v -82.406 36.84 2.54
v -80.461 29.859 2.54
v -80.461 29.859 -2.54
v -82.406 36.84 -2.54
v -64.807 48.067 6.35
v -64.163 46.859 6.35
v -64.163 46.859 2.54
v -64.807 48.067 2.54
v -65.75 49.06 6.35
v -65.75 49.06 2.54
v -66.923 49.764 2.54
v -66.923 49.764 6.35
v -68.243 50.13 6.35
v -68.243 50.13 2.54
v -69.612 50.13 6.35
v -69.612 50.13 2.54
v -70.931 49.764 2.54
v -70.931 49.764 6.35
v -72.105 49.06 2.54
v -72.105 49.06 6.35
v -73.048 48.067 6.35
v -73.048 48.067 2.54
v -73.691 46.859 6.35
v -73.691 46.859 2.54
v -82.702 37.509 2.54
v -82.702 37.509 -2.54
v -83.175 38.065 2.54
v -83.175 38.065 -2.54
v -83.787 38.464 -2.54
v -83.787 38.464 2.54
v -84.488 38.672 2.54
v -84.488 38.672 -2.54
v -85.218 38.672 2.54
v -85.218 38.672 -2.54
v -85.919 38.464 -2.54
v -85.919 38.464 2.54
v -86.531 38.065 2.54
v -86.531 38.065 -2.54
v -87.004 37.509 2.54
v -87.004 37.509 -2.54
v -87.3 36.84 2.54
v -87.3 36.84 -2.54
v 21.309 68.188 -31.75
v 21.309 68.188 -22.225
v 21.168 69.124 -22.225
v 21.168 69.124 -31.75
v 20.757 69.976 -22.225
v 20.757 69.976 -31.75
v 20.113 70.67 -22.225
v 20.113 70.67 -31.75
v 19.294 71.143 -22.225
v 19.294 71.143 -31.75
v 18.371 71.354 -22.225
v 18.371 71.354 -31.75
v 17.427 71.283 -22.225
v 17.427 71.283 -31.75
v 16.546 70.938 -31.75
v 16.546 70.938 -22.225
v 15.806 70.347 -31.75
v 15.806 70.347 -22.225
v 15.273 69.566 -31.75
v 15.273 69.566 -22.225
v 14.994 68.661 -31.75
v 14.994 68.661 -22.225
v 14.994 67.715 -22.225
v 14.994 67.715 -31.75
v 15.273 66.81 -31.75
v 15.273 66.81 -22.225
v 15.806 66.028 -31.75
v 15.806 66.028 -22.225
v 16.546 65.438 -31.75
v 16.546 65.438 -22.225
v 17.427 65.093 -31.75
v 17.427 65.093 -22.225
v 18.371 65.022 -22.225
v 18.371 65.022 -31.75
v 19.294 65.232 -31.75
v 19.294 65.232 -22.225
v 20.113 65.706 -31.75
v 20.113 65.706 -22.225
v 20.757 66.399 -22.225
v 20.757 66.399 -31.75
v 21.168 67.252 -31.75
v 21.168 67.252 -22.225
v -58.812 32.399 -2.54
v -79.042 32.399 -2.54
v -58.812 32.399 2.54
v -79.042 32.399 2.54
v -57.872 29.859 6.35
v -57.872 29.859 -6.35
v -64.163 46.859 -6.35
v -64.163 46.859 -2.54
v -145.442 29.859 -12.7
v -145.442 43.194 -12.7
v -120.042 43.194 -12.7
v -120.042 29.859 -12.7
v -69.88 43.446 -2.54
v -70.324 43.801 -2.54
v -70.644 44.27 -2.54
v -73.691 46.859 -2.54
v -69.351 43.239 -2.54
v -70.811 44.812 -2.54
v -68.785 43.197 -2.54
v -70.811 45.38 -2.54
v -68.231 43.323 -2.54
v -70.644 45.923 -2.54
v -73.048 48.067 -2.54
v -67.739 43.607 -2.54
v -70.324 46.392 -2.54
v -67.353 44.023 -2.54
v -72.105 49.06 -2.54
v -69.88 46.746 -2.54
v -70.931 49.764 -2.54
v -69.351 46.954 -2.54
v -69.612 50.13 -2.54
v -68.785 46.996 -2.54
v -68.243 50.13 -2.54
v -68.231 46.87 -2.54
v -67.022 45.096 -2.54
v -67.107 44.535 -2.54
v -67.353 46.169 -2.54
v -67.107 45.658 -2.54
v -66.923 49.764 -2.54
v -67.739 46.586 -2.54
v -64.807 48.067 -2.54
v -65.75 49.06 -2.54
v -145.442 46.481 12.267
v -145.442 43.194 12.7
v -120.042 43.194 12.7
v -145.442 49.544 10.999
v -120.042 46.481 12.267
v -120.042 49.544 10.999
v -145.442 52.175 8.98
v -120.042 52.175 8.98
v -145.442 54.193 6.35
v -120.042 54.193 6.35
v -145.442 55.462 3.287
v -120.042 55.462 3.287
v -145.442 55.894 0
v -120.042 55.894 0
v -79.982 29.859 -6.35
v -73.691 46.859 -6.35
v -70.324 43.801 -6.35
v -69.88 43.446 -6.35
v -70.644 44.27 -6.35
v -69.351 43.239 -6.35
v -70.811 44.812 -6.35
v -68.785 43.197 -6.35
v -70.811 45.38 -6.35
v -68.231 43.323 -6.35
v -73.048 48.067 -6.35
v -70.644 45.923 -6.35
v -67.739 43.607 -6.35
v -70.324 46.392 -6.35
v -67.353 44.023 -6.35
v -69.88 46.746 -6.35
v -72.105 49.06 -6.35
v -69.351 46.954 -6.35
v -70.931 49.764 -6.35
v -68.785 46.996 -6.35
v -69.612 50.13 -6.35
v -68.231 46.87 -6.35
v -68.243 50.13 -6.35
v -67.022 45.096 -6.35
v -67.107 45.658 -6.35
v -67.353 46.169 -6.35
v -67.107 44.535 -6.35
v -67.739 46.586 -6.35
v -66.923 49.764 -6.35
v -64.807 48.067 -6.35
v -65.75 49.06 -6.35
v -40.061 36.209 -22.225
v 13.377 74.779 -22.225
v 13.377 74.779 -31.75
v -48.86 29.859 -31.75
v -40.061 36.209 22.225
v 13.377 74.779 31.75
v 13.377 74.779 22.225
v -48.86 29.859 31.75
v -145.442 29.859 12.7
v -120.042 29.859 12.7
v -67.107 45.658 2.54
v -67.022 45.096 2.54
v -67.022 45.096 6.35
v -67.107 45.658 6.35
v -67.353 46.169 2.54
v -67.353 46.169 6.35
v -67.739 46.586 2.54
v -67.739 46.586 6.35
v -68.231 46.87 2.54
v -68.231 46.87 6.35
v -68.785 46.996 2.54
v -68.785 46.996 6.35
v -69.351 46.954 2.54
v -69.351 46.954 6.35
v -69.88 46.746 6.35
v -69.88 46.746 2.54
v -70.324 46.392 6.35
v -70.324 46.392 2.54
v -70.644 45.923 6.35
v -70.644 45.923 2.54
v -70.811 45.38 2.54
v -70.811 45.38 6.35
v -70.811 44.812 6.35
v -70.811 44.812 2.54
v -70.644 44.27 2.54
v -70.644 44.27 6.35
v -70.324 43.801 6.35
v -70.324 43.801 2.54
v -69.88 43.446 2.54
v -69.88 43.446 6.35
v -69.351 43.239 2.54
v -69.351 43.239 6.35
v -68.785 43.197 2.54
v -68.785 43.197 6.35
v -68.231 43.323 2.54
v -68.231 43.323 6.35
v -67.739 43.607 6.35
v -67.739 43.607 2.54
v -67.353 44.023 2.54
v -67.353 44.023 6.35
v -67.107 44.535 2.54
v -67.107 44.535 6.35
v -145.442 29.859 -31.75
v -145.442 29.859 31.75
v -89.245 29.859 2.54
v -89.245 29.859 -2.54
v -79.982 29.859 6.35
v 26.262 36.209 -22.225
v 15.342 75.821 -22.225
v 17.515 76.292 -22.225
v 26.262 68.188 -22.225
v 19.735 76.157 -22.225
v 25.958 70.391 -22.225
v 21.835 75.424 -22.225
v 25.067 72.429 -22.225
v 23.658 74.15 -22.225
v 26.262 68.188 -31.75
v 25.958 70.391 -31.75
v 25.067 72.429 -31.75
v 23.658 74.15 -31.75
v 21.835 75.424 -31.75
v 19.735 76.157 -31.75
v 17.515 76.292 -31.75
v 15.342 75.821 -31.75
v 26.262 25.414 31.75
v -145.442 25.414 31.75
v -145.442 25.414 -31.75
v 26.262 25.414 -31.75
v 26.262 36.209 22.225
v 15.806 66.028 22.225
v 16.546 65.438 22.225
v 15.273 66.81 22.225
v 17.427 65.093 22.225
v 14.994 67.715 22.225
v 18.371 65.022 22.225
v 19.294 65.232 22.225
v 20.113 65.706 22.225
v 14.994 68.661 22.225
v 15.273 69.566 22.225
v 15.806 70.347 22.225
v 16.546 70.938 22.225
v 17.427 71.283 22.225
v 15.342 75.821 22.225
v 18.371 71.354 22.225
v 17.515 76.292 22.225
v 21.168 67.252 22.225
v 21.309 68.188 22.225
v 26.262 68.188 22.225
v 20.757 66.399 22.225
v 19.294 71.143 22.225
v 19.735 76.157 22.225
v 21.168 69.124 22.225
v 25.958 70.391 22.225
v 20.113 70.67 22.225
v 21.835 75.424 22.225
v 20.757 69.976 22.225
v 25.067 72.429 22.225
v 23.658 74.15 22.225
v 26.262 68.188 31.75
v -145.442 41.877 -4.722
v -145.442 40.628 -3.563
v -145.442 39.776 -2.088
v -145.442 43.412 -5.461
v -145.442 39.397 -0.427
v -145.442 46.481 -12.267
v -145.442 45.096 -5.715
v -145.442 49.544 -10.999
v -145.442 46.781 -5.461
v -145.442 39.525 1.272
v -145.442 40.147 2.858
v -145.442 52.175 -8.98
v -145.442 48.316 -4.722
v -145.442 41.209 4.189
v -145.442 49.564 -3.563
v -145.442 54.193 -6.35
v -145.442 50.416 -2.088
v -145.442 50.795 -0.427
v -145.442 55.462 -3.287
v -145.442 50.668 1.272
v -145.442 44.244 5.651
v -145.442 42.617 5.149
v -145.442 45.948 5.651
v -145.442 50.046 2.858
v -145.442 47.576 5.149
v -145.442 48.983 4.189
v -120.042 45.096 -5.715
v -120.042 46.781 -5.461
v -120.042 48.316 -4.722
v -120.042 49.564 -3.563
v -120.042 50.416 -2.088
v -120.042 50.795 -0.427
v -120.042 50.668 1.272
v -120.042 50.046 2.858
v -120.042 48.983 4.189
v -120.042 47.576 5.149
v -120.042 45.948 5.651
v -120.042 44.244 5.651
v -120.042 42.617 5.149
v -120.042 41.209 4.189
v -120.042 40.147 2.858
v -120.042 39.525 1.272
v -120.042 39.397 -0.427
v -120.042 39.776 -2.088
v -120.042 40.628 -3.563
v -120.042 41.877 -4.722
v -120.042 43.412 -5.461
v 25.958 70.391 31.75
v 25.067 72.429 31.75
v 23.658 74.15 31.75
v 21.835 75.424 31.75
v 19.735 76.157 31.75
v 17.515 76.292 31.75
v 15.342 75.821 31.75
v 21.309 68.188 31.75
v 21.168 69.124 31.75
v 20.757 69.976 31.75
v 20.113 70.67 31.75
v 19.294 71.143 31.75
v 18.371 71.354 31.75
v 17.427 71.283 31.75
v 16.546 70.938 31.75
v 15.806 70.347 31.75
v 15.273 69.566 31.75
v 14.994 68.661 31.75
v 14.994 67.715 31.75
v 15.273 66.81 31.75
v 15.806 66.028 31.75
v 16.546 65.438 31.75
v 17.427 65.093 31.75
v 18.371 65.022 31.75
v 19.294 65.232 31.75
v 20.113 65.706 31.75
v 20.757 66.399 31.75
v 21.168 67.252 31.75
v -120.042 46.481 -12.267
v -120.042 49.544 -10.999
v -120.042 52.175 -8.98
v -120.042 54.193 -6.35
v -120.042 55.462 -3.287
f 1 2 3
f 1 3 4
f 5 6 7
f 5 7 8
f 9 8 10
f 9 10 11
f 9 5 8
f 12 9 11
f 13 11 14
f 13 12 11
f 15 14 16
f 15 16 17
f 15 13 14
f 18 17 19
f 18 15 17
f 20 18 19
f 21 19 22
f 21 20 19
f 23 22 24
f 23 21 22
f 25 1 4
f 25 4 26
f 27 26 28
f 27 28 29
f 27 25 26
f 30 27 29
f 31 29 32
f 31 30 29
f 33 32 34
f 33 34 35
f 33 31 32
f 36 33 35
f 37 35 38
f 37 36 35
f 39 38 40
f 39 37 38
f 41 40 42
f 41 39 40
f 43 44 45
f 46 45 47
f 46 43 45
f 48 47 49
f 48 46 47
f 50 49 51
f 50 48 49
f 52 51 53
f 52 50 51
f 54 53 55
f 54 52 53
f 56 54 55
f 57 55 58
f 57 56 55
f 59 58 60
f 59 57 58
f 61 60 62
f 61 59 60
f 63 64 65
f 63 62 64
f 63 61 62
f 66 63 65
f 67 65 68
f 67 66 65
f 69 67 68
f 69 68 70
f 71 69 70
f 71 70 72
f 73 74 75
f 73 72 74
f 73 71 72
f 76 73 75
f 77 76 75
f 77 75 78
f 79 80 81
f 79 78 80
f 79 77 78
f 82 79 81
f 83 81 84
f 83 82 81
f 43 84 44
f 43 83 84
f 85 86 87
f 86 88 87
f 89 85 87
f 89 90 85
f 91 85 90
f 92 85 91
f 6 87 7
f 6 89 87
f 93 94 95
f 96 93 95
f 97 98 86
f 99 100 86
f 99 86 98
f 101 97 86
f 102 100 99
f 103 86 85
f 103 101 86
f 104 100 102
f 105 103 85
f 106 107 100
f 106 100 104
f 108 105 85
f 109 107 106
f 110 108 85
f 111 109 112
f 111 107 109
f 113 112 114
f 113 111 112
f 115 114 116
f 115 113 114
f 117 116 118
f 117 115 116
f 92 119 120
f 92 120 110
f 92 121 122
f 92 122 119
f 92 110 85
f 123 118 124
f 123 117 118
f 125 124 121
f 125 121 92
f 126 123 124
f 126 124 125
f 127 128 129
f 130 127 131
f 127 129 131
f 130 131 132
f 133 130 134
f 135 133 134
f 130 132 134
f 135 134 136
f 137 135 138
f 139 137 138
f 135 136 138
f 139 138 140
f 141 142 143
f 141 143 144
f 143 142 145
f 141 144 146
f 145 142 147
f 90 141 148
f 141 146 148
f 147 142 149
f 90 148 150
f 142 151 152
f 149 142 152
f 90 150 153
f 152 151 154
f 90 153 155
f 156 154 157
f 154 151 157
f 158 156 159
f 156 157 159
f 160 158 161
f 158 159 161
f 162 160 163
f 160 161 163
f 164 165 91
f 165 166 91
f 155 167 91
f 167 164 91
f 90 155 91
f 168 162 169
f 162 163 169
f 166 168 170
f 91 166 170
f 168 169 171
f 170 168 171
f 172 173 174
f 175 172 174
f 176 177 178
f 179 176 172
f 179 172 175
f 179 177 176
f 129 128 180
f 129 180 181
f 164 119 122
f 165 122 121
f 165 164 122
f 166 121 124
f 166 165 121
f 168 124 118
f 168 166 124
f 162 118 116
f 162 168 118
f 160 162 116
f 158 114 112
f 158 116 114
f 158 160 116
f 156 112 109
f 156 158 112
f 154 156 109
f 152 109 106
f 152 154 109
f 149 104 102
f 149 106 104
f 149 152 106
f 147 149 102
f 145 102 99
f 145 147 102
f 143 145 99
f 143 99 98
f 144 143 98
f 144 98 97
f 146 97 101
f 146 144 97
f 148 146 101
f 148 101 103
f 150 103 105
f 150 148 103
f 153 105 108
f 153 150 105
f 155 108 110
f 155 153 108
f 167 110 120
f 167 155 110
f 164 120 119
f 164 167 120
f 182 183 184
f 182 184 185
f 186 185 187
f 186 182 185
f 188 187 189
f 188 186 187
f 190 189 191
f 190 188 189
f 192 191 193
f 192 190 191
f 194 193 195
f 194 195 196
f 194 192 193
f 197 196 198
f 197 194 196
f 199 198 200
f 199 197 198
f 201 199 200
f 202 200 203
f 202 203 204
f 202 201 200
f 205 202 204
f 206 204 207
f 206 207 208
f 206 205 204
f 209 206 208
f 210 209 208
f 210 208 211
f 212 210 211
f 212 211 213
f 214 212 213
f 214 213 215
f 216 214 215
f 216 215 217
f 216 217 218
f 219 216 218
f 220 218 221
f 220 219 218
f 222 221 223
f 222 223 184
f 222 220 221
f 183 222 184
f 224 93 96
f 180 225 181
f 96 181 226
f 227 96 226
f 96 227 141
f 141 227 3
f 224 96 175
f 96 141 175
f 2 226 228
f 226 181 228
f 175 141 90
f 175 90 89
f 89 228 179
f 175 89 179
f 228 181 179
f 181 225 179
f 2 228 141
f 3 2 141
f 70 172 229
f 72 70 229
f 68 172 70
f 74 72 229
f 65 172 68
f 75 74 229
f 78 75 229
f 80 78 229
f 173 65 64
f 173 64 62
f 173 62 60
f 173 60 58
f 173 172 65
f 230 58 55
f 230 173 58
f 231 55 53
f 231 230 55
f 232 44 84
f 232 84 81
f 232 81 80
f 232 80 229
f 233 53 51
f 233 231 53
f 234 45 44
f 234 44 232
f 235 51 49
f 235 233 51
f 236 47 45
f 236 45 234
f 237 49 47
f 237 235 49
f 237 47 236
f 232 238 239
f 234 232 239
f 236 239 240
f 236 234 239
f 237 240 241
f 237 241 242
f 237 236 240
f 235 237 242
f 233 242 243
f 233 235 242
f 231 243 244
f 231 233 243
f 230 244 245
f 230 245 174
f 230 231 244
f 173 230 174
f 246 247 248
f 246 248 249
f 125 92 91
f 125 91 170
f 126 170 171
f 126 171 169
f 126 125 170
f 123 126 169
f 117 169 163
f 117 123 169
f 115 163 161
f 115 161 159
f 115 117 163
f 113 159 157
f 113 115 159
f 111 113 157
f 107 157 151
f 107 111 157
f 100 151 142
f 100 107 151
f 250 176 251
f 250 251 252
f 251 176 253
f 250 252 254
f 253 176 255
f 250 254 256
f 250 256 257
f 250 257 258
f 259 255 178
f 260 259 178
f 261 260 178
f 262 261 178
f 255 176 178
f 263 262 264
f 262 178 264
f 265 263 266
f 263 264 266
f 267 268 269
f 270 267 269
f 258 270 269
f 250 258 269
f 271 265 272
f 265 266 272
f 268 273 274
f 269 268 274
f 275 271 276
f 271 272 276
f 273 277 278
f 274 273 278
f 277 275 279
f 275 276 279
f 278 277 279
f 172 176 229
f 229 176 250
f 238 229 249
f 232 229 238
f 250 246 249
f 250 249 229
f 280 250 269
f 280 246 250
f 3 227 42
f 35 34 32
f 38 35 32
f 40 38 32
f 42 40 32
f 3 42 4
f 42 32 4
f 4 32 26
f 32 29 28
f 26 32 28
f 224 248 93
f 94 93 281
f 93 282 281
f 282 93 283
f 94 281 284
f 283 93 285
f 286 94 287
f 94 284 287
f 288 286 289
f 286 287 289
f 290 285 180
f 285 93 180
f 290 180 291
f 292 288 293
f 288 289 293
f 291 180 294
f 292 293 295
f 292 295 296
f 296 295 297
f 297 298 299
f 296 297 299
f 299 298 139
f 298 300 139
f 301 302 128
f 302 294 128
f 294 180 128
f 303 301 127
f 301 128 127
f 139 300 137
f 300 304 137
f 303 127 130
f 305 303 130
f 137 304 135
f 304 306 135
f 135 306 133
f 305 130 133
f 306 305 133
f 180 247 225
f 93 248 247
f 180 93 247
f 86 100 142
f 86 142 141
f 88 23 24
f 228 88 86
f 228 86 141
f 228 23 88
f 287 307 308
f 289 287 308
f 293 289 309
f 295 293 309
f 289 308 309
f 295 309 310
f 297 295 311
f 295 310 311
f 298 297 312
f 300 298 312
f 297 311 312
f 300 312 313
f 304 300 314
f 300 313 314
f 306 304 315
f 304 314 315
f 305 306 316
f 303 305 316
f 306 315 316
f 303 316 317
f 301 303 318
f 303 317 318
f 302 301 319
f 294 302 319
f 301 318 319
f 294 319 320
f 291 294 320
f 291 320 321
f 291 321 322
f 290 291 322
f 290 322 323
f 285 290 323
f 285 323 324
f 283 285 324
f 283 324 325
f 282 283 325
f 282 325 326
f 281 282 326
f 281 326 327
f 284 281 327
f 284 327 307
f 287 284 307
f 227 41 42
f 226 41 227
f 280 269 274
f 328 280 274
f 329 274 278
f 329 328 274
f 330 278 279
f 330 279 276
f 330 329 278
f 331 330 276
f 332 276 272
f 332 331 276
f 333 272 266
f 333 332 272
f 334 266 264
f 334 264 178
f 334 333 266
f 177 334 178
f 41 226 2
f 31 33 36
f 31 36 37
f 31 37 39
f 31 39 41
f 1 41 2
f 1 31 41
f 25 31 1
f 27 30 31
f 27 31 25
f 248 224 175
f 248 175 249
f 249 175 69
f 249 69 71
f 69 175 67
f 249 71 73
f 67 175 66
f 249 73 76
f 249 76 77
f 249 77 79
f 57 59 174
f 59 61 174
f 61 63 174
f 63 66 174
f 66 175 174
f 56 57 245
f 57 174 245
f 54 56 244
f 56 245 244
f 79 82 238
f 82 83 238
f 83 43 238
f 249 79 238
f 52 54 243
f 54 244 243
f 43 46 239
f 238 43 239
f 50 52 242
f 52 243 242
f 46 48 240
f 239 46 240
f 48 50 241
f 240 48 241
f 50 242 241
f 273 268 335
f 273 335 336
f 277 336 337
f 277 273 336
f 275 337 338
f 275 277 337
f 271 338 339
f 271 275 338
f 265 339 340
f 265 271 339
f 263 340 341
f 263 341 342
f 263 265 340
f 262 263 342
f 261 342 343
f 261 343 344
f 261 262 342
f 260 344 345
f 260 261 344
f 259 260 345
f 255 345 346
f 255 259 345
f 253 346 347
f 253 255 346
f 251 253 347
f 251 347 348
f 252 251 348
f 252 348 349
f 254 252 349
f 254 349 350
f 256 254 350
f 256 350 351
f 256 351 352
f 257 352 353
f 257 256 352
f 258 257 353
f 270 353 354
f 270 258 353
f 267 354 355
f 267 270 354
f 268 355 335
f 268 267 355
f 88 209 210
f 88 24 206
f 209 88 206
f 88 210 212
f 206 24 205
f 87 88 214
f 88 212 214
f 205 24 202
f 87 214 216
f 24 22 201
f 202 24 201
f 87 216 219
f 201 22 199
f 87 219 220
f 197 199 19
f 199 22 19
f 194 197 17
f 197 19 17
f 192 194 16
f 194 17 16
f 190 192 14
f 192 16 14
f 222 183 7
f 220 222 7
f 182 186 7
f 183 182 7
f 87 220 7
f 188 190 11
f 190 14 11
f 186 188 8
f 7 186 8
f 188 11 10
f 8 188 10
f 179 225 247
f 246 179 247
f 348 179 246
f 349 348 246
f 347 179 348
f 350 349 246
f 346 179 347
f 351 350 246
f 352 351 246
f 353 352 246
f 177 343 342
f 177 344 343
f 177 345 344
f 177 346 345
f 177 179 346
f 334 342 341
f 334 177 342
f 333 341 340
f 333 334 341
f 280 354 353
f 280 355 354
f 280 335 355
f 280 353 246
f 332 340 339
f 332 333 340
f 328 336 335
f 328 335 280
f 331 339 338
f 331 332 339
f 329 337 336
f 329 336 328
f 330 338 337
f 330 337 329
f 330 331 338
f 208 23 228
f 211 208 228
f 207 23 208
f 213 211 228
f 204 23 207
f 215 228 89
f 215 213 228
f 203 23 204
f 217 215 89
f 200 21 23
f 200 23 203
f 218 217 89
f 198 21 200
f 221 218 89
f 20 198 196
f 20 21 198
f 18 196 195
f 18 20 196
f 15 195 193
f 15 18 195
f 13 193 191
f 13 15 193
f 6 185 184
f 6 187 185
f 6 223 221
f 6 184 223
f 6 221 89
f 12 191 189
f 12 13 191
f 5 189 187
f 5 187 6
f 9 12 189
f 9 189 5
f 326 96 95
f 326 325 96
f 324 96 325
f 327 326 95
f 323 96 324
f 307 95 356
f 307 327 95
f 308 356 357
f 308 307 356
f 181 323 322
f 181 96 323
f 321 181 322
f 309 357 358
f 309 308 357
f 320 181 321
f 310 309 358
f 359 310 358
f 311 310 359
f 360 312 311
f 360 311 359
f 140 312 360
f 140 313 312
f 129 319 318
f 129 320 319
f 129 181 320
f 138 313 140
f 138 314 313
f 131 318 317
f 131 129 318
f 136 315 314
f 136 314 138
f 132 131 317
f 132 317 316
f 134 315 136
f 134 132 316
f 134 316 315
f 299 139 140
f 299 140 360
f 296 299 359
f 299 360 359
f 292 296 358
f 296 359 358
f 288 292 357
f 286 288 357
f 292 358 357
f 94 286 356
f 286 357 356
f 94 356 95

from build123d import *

# Parameters (mm, degrees)
SKETCH1_W           = 171.704
SKETCH1_H           = 4.445
BASE_EXTRUDE_DEPTH  = 31.75
SKETCH4_W           = 25.4
SKETCH4_H           = 30.48
BOSS_EXTRUDE3_DEPTH = 12.7
SKETCH5_R           = 5.715
CUT_EXTRUDE1_DEPTH  = 160.803312245
SKETCH3_R           = 1.905
BOSS_EXTRUDE1_DEPTH = 6.35
SKETCH2_R           = 3.175
BOSS_EXTRUDE2_DEPTH = 31.75
FILLET1_R           = 12.7
CUT_EXTRUDE2_DEPTH  = 2.54
CUT_EXTRUDE4_DEPTH  = 22.225
BOSS_EXTRUDE4_DEPTH = 2.54


with BuildPart() as part:
    # Sketch1 → Base-Extrude (new, symmetric)
    with BuildSketch(Plane.XY):
        with Locations((-59.590145552, 27.636826085)):
            Rectangle(SKETCH1_W, SKETCH1_H)
    extrude(amount=BASE_EXTRUDE_DEPTH, both=True)

    # Sketch4 → Boss-Extrude3 (add, symmetric)
    with BuildSketch(Plane.XY):
        with Locations((-132.742145552, 40.654326085)):
            Rectangle(SKETCH4_W, SKETCH4_H)
    extrude(amount=BOSS_EXTRUDE3_DEPTH, both=True)

    # Sketch5 → Cut-Extrude1 (cut, through all)
    with BuildSketch(Plane(origin=(-120.042145552, 0, 0), x_dir=(0, 0, -1), z_dir=(1, 0, 0))):
        with Locations((0, 45.096262506)):
            Circle(SKETCH5_R)
    extrude(amount=-CUT_EXTRUDE1_DEPTH, mode=Mode.SUBTRACT)

    # Sketch3 → Boss-Extrude1 (add, symmetric)
    with BuildSketch(Plane.XY):
        with BuildLine():
            Line((-81.627185552, 25.414326085), (-56.227185552, 25.414326085))
            Line((-56.227185552, 25.414326085), (-64.162927469, 46.859284036))
            ThreePointArc((-64.162927469, 46.859284036), (-68.927185552, 50.176262506), (-73.691443636, 46.859284036))
            Line((-73.691443636, 46.859284036), (-81.627185552, 25.414326085))
        make_face()
        with Locations((-68.927185552, 45.096262506)):
            Circle(SKETCH3_R, mode=Mode.SUBTRACT)
    extrude(amount=BOSS_EXTRUDE1_DEPTH, both=True)

    # Sketch2 → Boss-Extrude2 (add, symmetric)
    with BuildSketch(Plane.XY):
        with BuildLine():
            Line((-55.018145552, 25.414326085), (26.261854448, 25.414326085))
            Line((26.261854448, 25.414326085), (26.261854448, 68.187926085))
            ThreePointArc((26.261854448, 68.187926085), (21.835266898, 75.424218635), (13.377029184, 74.77860112))
            Line((13.377029184, 74.77860112), (-55.018145552, 25.414326085))
        make_face()
        with Locations((18.133854448, 68.187926085)):
            Circle(SKETCH2_R, mode=Mode.SUBTRACT)
    extrude(amount=BOSS_EXTRUDE2_DEPTH, both=True)

    # Fillet1
    fillet1_edges = [part.edges().sort_by_distance(p)[0] for p in [
        (-132.742145552, 55.894326085, 12.7),
        (-132.742145552, 55.894326085, -12.7),
    ]]
    fillet(fillet1_edges, radius=FILLET1_R - 0.0001)  # a hair under: the kernel refuses the full size

    # Sketch6 → Cut-Extrude2 (cut, symmetric)
    with BuildSketch(Plane.XY):
        with BuildLine():
            Line((-79.042374828, 32.399326085), (-58.811996277, 32.399326085))
            Line((-58.811996277, 32.399326085), (-64.162927469, 46.859284036))
            ThreePointArc((-64.162927469, 46.859284036), (-68.927185552, 50.176262506), (-73.691443636, 46.859284036))
            Line((-73.691443636, 46.859284036), (-79.042374828, 32.399326085))
        make_face()
    extrude(amount=CUT_EXTRUDE2_DEPTH, both=True, mode=Mode.SUBTRACT)

    # Sketch7 → Cut-Extrude4 (cut, symmetric)
    with BuildSketch(Plane.XY):
        with BuildLine():
            Line((13.377029184, 74.77860112), (-40.061460566, 36.209326085))
            Line((-40.061460566, 36.209326085), (26.261854448, 36.209326085))
            Line((26.261854448, 36.209326085), (26.261854448, 68.187926085))
            ThreePointArc((26.261854448, 68.187926085), (21.835266898, 75.424218635), (13.377029184, 74.77860112))
        make_face()
    extrude(amount=CUT_EXTRUDE4_DEPTH, both=True, mode=Mode.SUBTRACT)

    # Sketch8 → Boss-Extrude4 (add, symmetric)
    with BuildSketch(Plane.XY):
        with BuildLine():
            Line((-90.484109136, 25.414326085), (-79.221861969, 25.414326085))
            Line((-79.221861969, 25.414326085), (-82.40622809, 36.840418981))
            ThreePointArc((-82.40622809, 36.840418981), (-84.852985552, 38.698526085), (-87.299743015, 36.840418981))
            Line((-87.299743015, 36.840418981), (-90.484109136, 25.414326085))
        make_face()
    extrude(amount=BOSS_EXTRUDE4_DEPTH, both=True)


solid = part.part
